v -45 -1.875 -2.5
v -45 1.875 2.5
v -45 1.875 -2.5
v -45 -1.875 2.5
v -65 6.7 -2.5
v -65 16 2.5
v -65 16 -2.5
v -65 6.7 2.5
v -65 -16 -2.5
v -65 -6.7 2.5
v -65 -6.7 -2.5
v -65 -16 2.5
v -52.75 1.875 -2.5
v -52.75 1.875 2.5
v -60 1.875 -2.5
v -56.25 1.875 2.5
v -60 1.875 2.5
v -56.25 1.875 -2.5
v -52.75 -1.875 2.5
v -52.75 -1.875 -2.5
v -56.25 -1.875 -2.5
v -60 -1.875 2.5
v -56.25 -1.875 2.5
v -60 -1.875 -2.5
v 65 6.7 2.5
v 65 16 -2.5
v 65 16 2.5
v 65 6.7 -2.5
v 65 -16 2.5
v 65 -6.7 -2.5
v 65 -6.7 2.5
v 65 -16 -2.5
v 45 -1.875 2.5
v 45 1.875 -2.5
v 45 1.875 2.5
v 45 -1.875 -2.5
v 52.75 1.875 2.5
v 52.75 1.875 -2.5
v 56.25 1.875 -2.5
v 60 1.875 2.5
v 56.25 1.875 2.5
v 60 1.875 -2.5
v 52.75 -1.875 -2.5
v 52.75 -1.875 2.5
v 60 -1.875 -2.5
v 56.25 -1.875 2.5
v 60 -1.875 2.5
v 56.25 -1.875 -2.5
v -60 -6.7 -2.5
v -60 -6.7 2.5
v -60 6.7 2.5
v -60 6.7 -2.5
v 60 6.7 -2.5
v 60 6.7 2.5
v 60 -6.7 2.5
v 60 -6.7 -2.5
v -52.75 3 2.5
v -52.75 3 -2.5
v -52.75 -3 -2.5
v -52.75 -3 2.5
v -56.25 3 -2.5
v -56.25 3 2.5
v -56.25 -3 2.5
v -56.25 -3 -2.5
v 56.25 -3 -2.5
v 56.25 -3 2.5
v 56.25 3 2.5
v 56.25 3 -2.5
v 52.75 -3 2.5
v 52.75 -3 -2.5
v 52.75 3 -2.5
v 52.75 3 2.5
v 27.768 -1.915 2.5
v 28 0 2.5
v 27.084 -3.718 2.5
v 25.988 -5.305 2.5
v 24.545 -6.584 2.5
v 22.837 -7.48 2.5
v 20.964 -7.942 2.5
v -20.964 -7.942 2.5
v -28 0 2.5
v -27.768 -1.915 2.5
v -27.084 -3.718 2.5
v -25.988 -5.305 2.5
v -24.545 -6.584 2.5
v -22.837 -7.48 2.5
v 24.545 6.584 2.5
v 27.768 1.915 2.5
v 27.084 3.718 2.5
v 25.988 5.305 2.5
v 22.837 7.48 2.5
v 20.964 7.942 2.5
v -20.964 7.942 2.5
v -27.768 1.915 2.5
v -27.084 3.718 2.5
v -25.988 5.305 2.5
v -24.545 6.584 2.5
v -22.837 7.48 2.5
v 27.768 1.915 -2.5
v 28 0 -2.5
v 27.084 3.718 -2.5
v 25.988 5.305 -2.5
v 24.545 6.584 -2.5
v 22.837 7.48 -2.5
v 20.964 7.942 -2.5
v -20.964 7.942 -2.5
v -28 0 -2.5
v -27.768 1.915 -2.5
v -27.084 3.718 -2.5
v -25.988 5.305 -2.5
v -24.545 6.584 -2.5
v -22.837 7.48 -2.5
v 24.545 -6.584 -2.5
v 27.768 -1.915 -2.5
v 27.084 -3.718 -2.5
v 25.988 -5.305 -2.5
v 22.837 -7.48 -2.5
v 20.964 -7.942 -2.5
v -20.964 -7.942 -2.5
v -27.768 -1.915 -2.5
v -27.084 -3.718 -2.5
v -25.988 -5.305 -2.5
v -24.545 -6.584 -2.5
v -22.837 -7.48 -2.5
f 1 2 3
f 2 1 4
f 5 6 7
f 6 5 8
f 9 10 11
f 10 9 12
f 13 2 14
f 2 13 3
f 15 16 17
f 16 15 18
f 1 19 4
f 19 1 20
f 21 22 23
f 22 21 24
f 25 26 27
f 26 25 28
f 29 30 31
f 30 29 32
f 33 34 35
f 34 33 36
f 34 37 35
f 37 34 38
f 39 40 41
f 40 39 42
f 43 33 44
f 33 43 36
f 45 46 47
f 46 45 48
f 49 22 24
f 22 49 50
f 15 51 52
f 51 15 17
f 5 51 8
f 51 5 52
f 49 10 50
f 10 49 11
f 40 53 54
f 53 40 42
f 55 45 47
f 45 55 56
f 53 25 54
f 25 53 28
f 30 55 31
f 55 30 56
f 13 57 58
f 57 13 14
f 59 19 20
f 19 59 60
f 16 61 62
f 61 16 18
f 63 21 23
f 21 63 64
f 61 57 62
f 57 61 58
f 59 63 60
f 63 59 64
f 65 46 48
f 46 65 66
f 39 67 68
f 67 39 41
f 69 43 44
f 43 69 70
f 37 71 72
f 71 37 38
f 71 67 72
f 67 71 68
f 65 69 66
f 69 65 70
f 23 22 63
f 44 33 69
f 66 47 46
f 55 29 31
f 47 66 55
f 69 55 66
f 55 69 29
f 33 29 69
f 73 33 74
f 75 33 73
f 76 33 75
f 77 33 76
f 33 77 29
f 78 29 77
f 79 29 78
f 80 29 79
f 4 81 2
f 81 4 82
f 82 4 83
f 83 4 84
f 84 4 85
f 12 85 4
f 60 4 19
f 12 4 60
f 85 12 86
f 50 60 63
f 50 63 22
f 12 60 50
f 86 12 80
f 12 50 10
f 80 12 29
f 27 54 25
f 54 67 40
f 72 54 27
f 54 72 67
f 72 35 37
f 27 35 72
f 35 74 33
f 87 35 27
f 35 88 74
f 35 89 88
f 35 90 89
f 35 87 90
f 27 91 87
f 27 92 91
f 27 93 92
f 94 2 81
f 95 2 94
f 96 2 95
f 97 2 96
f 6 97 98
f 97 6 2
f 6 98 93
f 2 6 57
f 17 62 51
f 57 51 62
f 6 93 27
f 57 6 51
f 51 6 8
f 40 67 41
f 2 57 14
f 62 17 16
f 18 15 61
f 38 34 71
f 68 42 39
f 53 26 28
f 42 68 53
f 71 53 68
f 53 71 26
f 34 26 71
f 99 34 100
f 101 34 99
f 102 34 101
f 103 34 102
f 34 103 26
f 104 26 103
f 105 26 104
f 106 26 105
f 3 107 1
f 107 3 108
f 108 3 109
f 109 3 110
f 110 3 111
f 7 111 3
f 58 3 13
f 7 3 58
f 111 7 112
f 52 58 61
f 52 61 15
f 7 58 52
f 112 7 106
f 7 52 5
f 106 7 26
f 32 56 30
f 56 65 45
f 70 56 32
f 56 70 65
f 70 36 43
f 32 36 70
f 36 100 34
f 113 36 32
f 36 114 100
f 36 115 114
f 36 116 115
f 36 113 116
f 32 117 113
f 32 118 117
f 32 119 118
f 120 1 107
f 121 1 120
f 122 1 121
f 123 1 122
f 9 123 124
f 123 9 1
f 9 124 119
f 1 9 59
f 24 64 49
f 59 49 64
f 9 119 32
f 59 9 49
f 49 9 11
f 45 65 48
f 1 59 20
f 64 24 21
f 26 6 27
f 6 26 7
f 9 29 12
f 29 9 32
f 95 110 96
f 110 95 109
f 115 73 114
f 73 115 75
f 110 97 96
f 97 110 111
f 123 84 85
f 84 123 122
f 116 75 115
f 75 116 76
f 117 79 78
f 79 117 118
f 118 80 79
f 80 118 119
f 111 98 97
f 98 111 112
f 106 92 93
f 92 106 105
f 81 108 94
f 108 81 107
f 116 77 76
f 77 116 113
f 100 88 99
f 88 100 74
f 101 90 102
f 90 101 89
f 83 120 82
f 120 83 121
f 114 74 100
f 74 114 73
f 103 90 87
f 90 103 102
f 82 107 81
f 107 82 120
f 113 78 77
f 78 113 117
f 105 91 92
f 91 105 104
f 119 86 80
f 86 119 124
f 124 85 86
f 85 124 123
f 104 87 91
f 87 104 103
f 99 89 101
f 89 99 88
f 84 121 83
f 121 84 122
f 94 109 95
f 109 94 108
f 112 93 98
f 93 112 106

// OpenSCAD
link();
module link(){
  difference(){
    cube([130,32,5], center=true);
    for(X=[-1,1]) translate([((130/2)-10)*X, 0, 0]) 
      cube([20,3.75,6], center=true);
    for(X=[-1,1]) translate([((130/2)-2.5)*X, 0, 0]) 
      cube([5,13.4,6], center=true);
    for(X=[-1,1]) translate([((130/2)-10.5)*X, 0, 0]) 
      cube([3.5,6,6], center=true);
    hull()
    for(X=[-1,1]) translate([20*X, 0, 0]) 
      cylinder(d=16,h=6, center=true);
  }
}
